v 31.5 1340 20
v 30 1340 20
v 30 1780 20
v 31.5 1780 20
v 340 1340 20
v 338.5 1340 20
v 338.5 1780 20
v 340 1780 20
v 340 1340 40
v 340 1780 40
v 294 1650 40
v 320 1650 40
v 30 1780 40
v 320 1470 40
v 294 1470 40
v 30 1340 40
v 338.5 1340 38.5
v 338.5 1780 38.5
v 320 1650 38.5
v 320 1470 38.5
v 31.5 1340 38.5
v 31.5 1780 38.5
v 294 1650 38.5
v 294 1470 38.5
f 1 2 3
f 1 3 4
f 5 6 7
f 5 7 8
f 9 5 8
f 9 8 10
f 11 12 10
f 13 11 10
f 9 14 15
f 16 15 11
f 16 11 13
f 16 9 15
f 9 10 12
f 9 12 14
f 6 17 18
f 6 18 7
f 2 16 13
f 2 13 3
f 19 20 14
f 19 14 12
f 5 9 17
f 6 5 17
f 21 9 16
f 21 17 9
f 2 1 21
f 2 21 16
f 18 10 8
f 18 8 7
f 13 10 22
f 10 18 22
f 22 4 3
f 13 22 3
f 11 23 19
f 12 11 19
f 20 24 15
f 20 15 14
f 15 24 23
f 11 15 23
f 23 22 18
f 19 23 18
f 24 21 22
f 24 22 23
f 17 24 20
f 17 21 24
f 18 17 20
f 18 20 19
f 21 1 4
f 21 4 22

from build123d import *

# Parameters (mm, degrees)
PRESS_KOVA_KAPAGI_KAPAK_1_START = 1340
PRESS_KOVA_KAPAGI_KAPAK_1_DEPTH = 440
PRESS_KOVA_KAPAGI_KAPAK_2_START = 27
SKETCH2_W                       = 26
SKETCH2_H                       = 180
PRESS_KOVA_KAPAGI_KAPAK_2_DEPTH = 14


with BuildPart() as part:
    # Sketch1 → PRESS_kova_kapagi_kapak_1 (new body)
    with BuildSketch(Plane(origin=(0, 0, 0), x_dir=(1, 0, 0), z_dir=(0, 1, 0)).offset(PRESS_KOVA_KAPAGI_KAPAK_1_START)):
        Polygon((30, -40), (30, -20), (31.5, -20), (31.5, -38.5), (338.5, -38.5), (338.5, -20), (340, -20), (340, -40), align=None)
    extrude(amount=PRESS_KOVA_KAPAGI_KAPAK_1_DEPTH)

    # Sketch2 → PRESS_kova_kapagi_kapak_2 (cut)
    with BuildSketch(Plane.XY.offset(PRESS_KOVA_KAPAGI_KAPAK_2_START)):
        with Locations((307, 1560)):
            Rectangle(SKETCH2_W, SKETCH2_H)
    extrude(amount=PRESS_KOVA_KAPAGI_KAPAK_2_DEPTH, mode=Mode.SUBTRACT)


solid = part.part
